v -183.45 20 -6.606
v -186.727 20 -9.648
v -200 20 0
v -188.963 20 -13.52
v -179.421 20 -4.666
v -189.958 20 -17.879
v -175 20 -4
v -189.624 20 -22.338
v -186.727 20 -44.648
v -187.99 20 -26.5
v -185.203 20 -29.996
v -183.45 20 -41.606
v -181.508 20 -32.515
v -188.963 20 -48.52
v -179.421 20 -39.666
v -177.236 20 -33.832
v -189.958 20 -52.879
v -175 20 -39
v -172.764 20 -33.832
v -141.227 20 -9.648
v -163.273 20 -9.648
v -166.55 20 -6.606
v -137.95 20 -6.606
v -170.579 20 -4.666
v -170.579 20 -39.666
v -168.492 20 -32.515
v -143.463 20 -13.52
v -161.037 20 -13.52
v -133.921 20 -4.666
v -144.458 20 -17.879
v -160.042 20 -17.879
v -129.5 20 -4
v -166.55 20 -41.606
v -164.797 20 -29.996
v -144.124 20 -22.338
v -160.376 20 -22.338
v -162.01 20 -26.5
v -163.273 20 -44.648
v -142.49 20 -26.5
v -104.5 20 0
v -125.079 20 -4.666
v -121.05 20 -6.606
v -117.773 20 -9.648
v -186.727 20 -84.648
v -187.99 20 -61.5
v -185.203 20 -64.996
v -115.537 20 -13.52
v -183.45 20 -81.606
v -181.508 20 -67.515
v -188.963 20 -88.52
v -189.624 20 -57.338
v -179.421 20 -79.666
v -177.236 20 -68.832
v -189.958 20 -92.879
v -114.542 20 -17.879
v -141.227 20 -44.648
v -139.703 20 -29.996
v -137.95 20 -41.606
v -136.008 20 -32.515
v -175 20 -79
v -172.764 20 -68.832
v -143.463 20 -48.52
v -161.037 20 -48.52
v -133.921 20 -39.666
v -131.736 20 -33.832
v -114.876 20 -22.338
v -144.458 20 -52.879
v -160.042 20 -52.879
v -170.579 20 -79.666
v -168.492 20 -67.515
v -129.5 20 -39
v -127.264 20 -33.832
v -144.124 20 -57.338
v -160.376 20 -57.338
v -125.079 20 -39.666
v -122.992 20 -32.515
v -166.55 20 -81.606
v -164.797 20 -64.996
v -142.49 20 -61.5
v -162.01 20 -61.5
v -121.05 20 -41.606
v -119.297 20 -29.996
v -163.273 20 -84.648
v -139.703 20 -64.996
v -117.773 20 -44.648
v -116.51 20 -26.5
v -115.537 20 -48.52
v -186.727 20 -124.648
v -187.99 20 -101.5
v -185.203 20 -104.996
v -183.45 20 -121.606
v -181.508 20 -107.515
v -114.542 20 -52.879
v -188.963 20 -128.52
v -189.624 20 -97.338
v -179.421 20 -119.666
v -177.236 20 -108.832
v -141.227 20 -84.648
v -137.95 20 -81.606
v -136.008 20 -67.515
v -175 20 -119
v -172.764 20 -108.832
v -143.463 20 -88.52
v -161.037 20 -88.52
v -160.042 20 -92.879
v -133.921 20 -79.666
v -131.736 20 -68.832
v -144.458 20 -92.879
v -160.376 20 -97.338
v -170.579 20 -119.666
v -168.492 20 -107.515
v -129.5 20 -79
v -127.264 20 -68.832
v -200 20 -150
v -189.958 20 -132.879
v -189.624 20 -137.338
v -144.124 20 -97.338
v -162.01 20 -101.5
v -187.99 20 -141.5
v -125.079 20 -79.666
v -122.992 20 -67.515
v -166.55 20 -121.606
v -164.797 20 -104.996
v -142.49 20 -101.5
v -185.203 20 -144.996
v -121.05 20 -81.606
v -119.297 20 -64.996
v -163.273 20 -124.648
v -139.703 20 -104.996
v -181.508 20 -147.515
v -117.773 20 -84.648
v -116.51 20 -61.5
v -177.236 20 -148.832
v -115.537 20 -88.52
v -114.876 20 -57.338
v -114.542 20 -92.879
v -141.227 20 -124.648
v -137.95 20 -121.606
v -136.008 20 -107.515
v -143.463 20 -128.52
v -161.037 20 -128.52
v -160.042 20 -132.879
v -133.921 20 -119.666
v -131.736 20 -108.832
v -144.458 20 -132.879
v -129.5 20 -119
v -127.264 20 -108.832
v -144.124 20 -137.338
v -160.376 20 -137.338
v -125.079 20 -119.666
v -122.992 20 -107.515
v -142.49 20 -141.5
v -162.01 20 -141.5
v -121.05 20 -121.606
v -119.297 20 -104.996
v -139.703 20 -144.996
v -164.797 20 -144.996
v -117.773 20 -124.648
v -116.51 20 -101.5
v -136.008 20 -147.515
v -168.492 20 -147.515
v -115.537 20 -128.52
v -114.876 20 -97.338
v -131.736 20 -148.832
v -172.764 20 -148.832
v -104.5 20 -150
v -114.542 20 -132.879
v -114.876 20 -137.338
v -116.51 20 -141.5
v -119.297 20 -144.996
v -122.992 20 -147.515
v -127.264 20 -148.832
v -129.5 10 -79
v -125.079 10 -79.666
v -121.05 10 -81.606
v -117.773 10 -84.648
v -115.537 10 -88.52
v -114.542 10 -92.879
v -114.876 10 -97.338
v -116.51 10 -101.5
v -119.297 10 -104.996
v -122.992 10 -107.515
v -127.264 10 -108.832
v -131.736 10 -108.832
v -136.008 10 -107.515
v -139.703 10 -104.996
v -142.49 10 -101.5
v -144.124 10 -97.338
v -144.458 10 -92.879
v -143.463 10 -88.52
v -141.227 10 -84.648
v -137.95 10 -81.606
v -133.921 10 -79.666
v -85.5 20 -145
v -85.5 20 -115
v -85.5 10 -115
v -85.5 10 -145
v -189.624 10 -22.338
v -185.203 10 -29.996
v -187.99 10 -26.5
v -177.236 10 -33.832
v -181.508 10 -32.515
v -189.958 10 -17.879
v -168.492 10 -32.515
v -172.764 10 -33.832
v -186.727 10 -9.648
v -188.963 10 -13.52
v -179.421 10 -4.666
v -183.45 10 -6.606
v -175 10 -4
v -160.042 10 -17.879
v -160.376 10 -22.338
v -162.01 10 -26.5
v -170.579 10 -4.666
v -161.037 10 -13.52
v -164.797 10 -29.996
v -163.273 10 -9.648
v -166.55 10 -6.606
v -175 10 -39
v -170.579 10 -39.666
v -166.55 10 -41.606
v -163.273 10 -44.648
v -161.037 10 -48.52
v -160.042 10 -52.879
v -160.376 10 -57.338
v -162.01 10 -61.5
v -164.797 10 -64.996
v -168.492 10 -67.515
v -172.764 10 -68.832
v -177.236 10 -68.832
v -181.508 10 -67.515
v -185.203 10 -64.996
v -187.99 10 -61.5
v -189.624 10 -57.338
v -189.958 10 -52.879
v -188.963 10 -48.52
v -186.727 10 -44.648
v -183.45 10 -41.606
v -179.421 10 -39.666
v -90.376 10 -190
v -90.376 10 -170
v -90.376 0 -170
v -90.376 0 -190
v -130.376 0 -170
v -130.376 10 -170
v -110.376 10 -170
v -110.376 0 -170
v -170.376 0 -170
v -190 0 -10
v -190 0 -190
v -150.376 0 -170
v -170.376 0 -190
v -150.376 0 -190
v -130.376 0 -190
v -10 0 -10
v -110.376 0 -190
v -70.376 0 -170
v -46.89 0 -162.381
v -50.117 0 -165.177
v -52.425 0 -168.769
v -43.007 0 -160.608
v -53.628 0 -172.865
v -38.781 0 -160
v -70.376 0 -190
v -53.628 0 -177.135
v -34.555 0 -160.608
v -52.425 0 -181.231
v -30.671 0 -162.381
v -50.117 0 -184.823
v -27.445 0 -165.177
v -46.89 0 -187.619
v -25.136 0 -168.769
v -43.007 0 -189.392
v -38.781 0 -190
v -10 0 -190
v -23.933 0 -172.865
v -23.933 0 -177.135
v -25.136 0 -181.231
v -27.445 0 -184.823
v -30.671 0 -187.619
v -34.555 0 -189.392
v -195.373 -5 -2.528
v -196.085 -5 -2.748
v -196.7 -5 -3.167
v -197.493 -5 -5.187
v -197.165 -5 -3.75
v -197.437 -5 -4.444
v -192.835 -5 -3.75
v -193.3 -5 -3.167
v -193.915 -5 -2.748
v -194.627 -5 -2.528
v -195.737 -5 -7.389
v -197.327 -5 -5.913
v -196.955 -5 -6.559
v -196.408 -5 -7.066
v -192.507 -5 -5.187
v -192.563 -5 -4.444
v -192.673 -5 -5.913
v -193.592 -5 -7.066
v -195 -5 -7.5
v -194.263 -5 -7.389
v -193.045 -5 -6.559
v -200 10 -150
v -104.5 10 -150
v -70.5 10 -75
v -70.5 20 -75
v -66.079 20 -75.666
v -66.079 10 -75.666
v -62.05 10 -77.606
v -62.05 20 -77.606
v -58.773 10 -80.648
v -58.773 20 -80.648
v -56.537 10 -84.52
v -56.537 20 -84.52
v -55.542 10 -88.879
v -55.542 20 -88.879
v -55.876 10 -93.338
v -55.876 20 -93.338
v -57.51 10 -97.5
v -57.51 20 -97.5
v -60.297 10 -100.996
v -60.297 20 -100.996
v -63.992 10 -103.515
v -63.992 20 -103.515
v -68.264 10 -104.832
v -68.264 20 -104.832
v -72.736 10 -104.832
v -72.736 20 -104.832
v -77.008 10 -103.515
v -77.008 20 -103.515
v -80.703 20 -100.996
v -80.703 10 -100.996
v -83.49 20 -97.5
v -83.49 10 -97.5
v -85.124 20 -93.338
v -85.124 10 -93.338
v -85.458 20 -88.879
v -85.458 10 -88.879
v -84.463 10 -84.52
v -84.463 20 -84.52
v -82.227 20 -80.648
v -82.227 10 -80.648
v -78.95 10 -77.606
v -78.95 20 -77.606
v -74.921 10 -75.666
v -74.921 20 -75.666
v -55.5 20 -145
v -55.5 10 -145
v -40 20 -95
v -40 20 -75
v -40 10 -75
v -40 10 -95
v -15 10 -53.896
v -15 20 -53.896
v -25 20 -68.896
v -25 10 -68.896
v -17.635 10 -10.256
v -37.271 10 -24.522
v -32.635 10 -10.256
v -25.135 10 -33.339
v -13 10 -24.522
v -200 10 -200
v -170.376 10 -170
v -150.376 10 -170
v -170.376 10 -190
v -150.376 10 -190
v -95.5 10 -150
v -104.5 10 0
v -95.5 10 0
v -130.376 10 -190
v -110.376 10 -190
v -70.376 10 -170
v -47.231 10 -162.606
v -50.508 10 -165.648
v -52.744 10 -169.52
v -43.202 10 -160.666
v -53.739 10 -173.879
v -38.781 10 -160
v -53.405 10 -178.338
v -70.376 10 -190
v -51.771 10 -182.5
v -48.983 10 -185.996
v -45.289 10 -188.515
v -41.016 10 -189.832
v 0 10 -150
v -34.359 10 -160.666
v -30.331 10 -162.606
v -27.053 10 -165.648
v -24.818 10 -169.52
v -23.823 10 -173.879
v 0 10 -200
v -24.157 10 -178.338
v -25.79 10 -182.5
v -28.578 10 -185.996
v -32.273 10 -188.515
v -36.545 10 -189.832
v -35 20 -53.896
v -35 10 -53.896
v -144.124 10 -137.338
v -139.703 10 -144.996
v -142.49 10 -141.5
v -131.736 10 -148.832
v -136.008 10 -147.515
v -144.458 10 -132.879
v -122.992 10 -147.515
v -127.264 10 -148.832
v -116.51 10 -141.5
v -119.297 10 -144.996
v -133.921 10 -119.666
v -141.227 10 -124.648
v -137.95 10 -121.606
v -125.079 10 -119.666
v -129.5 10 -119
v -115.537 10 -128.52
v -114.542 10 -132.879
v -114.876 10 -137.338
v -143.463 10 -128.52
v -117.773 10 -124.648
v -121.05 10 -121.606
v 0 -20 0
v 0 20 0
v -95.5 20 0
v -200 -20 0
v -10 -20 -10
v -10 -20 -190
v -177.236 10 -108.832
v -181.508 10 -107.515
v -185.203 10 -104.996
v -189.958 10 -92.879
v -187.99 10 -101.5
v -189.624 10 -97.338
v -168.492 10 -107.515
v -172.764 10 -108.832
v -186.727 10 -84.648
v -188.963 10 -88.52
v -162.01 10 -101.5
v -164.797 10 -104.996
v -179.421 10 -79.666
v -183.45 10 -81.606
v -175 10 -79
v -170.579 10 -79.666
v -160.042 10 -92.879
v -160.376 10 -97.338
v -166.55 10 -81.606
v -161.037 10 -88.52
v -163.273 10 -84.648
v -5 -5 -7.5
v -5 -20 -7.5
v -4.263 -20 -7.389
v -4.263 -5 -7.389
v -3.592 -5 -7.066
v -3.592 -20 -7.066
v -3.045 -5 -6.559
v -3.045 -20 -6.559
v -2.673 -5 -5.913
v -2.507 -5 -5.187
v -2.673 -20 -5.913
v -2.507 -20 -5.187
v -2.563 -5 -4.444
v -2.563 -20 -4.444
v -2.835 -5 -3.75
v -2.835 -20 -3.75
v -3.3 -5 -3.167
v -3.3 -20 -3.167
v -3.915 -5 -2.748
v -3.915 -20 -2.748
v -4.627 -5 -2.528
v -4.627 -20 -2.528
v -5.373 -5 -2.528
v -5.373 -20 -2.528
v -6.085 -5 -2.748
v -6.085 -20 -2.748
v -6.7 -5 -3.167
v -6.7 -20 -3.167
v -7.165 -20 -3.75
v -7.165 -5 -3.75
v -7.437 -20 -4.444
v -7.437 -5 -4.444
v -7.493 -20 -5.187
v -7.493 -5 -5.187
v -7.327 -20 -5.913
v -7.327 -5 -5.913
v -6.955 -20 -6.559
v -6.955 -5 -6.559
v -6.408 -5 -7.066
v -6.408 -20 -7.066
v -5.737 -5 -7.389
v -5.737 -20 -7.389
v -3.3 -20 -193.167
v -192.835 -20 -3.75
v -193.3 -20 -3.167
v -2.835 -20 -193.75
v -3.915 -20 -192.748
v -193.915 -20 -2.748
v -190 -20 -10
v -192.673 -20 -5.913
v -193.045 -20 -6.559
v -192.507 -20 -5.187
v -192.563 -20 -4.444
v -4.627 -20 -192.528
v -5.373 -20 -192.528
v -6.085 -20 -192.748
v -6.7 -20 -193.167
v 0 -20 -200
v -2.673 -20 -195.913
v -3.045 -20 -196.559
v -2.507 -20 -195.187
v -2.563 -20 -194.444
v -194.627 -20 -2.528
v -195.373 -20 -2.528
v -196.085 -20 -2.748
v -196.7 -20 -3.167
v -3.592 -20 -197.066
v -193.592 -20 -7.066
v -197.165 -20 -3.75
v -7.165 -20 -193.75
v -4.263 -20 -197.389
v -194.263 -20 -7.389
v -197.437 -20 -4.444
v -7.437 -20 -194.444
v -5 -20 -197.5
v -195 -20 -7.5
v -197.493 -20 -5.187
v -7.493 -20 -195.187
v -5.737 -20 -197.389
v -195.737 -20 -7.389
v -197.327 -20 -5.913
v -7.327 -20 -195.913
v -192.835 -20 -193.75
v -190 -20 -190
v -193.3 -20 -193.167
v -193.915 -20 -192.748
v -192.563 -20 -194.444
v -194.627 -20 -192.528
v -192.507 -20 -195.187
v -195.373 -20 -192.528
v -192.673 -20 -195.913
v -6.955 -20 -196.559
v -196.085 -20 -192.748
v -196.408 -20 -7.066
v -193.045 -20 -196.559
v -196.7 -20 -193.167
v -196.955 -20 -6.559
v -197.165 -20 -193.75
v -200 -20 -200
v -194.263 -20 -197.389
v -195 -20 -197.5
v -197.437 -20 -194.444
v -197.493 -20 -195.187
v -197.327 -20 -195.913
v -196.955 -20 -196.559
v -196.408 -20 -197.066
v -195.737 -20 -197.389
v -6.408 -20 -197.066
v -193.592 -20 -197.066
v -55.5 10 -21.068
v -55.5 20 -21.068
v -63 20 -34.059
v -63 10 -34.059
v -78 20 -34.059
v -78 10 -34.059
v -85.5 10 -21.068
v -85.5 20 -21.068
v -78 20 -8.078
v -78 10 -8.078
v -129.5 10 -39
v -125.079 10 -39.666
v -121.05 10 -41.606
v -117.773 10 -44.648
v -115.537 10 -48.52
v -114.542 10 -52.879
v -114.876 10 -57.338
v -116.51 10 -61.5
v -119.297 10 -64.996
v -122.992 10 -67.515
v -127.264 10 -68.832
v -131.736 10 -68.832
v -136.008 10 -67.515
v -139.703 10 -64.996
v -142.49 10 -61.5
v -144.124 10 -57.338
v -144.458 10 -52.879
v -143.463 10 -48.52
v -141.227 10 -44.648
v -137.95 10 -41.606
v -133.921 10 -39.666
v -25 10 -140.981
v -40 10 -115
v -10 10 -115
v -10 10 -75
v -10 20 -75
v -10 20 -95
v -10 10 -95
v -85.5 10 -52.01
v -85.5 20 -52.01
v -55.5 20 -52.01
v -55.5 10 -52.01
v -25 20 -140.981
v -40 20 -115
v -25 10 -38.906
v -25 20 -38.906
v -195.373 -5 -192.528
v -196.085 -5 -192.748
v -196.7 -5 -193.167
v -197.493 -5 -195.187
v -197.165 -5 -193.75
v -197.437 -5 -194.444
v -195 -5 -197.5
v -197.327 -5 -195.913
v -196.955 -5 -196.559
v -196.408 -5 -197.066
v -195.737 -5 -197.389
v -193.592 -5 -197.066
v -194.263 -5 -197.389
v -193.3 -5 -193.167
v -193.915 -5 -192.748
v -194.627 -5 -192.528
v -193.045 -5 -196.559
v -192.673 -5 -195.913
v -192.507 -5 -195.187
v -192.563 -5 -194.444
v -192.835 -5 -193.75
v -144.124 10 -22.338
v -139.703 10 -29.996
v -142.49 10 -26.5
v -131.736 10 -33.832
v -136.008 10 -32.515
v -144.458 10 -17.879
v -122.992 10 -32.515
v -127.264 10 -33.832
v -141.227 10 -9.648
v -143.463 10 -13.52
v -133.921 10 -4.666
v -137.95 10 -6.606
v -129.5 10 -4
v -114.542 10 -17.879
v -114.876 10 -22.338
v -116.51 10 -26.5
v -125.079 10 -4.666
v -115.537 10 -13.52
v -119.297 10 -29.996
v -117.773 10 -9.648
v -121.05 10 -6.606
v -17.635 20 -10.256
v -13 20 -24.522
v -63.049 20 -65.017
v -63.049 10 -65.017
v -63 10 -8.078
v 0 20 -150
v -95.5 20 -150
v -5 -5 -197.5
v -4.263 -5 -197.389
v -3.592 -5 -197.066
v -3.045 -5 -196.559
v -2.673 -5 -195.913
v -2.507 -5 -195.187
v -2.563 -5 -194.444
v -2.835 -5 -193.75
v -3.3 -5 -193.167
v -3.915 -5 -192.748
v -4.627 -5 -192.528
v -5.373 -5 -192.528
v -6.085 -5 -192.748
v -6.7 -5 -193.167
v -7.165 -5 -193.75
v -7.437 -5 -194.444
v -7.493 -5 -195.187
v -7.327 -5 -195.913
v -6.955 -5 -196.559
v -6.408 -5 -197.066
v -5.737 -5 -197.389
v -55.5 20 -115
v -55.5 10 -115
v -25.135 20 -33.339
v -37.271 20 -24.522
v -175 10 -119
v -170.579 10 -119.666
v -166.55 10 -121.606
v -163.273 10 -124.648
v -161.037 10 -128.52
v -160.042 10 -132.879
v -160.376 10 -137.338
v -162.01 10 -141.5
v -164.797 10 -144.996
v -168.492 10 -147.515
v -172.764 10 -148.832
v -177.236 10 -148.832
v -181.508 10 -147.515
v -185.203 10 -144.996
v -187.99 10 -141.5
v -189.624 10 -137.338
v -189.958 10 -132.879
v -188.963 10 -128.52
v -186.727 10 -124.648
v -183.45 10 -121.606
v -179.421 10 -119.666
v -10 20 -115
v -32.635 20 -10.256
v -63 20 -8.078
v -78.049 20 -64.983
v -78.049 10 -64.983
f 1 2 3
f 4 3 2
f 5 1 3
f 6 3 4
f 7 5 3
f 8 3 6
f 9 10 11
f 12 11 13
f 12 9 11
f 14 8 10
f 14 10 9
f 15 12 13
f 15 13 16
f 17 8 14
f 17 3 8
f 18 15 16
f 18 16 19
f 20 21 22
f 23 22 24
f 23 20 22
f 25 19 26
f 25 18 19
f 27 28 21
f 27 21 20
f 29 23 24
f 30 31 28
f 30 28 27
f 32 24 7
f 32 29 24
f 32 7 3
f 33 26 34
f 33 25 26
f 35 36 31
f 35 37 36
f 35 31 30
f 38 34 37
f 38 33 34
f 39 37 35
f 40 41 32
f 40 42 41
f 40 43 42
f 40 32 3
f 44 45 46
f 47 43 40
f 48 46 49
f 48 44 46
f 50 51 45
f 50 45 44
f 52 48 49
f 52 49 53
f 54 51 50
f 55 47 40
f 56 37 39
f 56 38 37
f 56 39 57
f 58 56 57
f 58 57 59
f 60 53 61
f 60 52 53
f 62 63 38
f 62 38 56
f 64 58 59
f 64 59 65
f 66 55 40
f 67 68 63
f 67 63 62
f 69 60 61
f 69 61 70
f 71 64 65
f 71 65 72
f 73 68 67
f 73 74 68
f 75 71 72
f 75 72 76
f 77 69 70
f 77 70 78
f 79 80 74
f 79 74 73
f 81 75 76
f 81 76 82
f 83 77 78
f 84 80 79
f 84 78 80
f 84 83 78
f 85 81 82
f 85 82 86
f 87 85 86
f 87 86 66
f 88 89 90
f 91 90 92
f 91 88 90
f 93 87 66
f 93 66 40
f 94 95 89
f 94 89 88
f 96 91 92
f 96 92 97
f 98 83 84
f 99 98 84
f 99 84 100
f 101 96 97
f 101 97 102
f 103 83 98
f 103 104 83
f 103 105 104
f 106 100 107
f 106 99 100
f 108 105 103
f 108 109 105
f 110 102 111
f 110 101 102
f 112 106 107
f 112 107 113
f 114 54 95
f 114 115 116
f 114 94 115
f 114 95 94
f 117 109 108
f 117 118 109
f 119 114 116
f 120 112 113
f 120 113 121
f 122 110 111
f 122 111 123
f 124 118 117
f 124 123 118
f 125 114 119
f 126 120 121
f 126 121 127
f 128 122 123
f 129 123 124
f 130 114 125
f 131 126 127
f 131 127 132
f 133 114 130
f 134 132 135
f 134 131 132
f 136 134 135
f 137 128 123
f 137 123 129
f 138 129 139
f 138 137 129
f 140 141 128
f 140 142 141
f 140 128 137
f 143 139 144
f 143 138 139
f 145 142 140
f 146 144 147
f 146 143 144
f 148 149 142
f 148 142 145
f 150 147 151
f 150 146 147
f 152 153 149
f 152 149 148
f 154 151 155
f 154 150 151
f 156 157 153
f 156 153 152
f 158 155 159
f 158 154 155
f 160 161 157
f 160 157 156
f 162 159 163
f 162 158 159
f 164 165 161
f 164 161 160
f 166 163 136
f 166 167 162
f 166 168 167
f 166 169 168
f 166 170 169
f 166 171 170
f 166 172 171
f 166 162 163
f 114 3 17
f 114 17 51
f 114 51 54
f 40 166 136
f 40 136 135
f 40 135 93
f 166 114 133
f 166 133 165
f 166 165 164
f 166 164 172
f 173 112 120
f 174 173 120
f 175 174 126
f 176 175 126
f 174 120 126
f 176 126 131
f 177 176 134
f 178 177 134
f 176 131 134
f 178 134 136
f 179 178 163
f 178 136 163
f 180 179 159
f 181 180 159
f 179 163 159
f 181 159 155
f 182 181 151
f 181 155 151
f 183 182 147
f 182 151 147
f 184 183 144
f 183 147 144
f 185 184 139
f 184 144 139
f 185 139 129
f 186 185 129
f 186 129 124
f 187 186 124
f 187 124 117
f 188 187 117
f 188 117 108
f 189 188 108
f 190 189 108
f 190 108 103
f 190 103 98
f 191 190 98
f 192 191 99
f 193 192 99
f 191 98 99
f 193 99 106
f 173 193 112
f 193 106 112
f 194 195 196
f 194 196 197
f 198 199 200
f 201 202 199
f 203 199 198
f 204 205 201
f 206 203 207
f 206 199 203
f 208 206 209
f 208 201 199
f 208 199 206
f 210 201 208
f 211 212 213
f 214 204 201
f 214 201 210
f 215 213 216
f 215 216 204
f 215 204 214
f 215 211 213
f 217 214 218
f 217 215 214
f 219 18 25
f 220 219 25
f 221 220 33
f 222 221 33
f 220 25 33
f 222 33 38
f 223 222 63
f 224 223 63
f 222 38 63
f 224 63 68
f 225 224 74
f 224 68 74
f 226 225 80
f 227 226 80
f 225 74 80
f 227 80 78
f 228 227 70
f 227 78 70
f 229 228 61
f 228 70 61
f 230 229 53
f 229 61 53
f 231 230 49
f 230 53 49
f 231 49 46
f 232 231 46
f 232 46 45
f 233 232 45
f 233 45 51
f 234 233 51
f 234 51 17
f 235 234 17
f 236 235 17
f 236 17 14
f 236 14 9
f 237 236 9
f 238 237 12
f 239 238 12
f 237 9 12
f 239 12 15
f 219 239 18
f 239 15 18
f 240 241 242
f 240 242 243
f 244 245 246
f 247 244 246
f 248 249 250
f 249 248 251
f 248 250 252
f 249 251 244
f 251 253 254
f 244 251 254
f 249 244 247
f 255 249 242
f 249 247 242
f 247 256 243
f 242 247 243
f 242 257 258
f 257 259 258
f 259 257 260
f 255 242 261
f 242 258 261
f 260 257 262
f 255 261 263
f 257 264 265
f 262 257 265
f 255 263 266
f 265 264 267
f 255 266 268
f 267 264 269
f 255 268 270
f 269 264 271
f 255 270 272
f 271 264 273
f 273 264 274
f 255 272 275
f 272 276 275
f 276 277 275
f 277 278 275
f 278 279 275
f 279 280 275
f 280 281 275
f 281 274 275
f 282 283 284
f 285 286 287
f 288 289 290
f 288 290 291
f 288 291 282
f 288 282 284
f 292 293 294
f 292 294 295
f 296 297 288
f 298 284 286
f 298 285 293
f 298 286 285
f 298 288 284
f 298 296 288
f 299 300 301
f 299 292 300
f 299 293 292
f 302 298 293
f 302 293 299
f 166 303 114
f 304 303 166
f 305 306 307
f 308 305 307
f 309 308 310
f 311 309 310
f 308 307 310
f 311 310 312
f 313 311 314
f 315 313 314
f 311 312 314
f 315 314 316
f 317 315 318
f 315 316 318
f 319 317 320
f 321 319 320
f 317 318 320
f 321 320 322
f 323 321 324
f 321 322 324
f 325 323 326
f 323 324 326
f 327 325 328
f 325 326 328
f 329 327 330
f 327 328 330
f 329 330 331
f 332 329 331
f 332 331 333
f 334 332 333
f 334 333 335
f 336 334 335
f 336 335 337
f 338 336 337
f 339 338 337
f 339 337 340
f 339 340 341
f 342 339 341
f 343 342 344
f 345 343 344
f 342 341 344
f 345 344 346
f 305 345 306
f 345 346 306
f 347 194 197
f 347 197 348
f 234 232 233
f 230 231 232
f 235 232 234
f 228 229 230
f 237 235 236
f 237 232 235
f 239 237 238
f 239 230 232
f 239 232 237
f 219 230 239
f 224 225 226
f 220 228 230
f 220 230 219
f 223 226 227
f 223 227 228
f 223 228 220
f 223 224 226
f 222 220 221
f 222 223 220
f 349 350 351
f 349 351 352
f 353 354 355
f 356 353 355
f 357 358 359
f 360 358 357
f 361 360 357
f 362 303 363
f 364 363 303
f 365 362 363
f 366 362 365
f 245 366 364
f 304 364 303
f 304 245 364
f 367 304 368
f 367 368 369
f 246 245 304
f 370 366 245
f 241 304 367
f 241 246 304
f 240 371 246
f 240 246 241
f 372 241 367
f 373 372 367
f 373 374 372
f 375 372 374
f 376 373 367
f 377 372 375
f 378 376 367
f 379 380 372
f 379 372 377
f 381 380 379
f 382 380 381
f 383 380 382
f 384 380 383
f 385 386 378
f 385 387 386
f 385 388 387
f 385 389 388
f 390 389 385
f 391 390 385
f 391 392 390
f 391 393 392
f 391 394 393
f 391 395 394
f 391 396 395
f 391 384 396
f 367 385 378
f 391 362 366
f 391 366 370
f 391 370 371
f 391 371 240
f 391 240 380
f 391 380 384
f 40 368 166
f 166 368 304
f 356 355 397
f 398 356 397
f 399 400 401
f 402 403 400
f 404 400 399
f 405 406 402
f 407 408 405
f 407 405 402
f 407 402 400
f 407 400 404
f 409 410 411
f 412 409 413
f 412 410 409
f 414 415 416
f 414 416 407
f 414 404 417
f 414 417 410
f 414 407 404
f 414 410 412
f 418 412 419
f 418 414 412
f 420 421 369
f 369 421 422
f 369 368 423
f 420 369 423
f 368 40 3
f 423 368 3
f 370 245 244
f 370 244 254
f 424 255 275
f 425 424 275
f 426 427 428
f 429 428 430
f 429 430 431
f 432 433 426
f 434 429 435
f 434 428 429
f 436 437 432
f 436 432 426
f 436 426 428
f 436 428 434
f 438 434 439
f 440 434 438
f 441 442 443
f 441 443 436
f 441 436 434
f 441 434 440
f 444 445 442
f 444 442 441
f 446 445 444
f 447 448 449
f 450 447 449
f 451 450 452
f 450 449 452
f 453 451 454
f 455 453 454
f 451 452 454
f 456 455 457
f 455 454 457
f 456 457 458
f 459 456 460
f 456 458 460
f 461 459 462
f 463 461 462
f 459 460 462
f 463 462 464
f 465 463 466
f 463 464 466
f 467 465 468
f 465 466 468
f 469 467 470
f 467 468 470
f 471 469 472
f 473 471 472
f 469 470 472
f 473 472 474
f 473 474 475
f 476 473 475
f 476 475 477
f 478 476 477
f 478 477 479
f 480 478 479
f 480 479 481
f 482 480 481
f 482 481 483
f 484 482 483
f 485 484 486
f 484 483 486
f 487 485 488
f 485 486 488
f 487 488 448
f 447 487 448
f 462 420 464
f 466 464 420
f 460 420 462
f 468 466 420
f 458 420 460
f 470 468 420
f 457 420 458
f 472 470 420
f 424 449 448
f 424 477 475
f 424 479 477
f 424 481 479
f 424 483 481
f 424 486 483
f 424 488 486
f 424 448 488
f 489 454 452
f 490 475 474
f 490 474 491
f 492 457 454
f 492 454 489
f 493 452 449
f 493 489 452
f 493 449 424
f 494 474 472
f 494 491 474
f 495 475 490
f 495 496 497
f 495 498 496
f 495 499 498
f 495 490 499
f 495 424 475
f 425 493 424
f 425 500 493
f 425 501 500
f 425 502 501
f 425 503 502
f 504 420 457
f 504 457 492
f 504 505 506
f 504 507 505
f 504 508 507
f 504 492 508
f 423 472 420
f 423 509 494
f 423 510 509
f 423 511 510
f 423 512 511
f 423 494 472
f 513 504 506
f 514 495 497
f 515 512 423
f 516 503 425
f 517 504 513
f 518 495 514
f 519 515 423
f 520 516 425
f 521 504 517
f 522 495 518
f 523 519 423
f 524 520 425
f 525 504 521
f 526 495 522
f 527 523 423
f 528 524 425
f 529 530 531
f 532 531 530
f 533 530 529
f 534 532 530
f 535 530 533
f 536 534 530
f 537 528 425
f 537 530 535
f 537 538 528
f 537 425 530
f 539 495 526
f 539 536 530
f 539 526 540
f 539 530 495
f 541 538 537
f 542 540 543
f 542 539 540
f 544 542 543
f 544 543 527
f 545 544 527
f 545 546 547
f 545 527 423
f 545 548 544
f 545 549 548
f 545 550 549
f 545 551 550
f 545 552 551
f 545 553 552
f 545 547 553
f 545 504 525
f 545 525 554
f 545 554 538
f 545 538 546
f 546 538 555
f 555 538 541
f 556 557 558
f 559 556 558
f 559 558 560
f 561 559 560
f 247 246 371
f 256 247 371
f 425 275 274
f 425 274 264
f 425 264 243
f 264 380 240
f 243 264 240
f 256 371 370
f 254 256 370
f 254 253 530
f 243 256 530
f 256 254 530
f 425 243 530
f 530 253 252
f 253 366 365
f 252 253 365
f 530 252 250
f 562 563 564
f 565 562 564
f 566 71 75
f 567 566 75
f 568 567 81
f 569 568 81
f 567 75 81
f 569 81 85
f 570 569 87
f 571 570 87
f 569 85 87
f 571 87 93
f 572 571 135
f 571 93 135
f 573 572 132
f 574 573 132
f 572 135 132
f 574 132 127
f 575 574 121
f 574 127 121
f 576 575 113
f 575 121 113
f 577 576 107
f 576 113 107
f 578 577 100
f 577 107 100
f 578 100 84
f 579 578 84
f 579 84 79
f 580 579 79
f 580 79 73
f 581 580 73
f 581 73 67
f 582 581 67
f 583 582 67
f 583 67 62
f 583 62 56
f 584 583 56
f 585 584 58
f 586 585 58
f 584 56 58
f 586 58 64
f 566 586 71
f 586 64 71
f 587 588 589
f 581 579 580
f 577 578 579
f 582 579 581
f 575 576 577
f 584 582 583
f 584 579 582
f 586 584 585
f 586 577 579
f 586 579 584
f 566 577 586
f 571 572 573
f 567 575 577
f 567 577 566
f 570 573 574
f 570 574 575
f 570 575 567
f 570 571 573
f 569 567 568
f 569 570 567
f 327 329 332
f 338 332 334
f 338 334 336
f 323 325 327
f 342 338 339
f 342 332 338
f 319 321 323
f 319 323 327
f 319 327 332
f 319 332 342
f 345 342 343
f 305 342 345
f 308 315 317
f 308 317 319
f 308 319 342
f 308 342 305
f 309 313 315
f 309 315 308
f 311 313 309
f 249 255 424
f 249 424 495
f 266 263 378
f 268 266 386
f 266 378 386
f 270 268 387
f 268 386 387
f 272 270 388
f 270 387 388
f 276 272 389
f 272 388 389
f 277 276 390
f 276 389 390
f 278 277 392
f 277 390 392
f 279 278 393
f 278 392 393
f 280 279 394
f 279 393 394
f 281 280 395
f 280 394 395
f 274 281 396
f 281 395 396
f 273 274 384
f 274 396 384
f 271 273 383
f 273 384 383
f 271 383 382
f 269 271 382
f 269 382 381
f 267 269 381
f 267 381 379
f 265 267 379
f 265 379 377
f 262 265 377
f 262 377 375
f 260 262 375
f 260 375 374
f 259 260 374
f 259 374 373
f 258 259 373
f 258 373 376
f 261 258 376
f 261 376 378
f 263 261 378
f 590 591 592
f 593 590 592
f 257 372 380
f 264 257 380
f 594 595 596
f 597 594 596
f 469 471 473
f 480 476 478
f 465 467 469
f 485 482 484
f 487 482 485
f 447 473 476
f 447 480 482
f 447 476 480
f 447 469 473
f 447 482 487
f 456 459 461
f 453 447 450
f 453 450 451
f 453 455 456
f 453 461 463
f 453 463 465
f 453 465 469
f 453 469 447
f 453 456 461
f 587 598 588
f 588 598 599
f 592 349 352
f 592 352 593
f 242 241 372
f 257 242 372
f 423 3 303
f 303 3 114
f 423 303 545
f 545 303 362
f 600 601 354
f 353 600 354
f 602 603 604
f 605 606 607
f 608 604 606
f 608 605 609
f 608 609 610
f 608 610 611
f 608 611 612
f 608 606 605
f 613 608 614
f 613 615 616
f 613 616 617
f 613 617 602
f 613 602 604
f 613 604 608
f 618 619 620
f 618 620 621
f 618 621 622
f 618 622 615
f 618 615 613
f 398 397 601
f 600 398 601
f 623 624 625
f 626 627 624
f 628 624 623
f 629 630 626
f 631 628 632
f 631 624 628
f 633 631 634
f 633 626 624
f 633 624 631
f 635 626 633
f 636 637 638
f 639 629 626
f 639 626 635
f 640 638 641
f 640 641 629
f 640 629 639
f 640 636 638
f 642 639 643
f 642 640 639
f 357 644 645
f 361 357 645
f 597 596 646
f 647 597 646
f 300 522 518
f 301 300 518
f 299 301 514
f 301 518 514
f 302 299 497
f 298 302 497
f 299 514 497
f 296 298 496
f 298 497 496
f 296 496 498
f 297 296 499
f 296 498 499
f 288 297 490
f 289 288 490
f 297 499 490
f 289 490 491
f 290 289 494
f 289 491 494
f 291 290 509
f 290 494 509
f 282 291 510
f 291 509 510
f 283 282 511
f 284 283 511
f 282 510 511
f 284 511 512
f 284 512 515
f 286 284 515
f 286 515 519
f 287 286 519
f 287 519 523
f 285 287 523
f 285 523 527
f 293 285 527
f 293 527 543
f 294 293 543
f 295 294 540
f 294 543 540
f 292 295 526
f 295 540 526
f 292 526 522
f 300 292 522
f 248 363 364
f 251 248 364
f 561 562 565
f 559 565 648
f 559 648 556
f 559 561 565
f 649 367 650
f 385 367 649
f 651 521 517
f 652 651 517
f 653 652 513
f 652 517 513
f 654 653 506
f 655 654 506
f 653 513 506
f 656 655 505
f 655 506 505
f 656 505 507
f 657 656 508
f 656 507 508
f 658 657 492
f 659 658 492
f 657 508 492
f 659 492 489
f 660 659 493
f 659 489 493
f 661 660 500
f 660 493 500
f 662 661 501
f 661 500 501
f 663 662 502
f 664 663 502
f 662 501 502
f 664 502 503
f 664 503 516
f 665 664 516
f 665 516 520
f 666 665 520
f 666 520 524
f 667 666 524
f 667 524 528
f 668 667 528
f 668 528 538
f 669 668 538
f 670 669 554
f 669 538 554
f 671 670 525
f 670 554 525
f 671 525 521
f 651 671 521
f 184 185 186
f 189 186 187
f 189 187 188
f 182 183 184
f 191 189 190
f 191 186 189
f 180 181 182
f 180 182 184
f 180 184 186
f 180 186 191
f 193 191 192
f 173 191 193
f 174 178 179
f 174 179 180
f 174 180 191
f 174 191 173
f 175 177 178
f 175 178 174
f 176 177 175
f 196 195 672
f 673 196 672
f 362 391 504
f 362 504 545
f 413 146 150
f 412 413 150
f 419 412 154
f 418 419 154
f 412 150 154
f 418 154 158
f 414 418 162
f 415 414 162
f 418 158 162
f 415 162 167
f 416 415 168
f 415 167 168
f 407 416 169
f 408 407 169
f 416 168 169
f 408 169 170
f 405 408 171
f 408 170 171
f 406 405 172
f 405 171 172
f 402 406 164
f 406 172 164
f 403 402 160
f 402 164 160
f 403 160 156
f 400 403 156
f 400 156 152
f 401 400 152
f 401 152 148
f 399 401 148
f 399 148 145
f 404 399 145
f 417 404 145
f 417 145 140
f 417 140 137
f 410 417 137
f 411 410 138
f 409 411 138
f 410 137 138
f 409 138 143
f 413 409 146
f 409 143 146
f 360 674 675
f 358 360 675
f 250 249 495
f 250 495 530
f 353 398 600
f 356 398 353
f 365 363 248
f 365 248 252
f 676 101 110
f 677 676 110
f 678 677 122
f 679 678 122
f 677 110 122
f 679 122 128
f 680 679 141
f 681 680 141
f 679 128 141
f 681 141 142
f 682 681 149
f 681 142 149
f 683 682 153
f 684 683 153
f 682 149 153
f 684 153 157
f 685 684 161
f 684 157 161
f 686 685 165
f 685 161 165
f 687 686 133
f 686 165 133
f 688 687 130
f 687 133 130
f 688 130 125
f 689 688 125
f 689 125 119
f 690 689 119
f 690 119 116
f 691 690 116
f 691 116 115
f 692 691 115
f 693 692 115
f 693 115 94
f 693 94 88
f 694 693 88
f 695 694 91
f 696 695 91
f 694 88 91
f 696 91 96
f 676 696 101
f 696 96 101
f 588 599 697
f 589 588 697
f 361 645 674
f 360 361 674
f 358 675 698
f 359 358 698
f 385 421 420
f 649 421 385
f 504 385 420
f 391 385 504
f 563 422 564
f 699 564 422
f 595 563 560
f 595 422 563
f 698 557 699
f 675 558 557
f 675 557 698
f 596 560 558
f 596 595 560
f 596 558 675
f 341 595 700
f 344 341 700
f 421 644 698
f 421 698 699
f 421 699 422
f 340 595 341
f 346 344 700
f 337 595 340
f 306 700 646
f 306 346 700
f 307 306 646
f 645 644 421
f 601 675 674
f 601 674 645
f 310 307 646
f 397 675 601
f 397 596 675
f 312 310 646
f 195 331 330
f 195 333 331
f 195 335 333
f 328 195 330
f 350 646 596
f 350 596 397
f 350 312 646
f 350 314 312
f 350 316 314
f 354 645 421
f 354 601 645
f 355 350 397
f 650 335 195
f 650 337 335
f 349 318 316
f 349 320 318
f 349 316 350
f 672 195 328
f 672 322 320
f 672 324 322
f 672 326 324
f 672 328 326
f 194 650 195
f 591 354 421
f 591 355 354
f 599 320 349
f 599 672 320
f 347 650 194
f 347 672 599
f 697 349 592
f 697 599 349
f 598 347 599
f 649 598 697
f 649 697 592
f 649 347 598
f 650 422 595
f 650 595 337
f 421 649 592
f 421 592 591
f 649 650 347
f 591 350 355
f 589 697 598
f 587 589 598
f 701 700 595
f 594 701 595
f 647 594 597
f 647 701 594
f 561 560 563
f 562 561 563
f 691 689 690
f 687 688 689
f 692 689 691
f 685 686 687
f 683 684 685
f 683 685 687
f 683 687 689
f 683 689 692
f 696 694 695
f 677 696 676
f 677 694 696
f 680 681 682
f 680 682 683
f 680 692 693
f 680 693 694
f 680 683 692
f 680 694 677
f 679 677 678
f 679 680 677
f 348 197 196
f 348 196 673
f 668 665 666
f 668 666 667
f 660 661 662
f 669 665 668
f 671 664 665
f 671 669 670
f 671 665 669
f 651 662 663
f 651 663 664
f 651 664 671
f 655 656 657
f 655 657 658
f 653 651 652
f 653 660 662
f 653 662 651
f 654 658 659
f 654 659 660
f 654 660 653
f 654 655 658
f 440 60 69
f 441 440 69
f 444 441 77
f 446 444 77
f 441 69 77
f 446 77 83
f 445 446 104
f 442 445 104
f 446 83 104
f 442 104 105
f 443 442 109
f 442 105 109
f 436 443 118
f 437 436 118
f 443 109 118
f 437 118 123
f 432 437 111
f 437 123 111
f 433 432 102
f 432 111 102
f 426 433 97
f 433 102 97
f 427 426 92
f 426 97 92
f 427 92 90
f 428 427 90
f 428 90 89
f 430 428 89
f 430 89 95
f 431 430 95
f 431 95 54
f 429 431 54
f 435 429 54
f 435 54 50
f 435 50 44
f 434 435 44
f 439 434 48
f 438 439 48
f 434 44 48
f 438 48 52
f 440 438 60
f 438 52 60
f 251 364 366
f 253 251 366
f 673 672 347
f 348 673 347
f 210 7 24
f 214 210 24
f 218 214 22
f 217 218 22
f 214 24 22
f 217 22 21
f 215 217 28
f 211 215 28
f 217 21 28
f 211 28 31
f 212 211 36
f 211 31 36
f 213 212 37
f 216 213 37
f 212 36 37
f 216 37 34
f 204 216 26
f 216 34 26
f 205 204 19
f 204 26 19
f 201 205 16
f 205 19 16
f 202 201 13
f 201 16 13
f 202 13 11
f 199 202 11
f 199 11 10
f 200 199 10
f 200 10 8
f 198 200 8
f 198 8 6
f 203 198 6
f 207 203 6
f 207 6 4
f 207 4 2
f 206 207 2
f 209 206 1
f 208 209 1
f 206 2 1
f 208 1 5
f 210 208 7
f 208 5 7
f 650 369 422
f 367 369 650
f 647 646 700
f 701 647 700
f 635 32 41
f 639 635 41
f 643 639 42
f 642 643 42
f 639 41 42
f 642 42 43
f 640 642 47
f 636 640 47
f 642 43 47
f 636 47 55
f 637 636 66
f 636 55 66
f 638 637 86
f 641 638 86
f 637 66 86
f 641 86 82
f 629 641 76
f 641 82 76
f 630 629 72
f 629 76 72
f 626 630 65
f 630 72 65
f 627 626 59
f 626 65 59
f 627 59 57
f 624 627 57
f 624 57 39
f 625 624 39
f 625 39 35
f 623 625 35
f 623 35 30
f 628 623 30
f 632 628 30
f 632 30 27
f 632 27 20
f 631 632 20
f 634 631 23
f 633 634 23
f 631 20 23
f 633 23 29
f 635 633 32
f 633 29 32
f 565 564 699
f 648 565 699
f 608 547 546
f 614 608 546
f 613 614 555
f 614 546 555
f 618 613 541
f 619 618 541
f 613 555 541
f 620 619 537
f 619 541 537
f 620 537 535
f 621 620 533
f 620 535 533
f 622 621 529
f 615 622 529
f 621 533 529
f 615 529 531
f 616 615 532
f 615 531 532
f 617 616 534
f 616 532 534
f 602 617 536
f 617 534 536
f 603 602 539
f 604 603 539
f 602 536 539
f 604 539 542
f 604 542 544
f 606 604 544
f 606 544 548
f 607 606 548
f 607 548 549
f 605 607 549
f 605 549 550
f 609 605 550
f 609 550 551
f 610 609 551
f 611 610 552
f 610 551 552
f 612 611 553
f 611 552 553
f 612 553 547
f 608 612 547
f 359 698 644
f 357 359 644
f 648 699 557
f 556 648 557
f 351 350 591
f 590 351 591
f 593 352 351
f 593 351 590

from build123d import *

# Parameters (mm, degrees)
CROQUIS1_W              = 200
CROQUIS1_H              = 200
SALIENTE_EXTRUIR1_DEPTH = 10
CROQUIS2_W              = 95.5
CROQUIS2_H              = 150
SALIENTE_EXTRUIR2_DEPTH = 10
CROQUIS3_R              = 15
CROQUIS3_W              = 20
CROQUIS3_H              = 20
CORTAR_EXTRUIR1_DEPTH   = 284.019433962
CROQUIS4_W              = 200
CROQUIS4_H              = 200
CROQUIS4_W_2            = 180
CROQUIS4_H_2            = 180
SALIENTE_EXTRUIR3_DEPTH = 20
CROQUIS6_R              = 2.5
CORTAR_EXTRUIR2_DEPTH   = 15
CROQUIS7_R              = 15
CORTAR_EXTRUIR3_DEPTH   = 10
CROQUIS8_R              = 15
CROQUIS8_W              = 30
CROQUIS8_H              = 30
CROQUIS8_H_2            = 20
CORTAR_EXTRUIR4_DEPTH   = 10


with BuildPart() as part:
    # Croquis1 → Saliente-Extruir1 (new body)
    with BuildSketch(Plane(origin=(0, 0, 0), x_dir=(1, 0, 0), z_dir=(0, 1, 0))):
        with Locations((-100, 100)):
            Rectangle(CROQUIS1_W, CROQUIS1_H)
    extrude(amount=SALIENTE_EXTRUIR1_DEPTH)

    # Croquis2 → Saliente-Extruir2 (add)
    with BuildSketch(Plane(origin=(0, 10, 0), x_dir=(1, 0, 0), z_dir=(0, 1, 0))):
        with Locations((-47.75, 75)):
            Rectangle(CROQUIS2_W, CROQUIS2_H)
        with Locations((-152.25, 75)):
            Rectangle(CROQUIS2_W, CROQUIS2_H)
    extrude(amount=SALIENTE_EXTRUIR2_DEPTH)

    # Croquis3 → Cortar-Extruir1 (cut, through all)
    with BuildSketch(Plane(origin=(0, 10, 0), x_dir=(1, 0, 0), z_dir=(0, 1, 0))):
        with Locations(Location((-38.780765976, 175, 0), (0, 0, 270))):
            Circle(CROQUIS3_R)
        with Locations((-160.375957062, 180)):
            Rectangle(CROQUIS3_W, CROQUIS3_H)
        with Locations((-120.375957062, 180)):
            Rectangle(CROQUIS3_W, CROQUIS3_H)
        with Locations((-80.375957062, 180)):
            Rectangle(CROQUIS3_W, CROQUIS3_H)
    extrude(amount=-CORTAR_EXTRUIR1_DEPTH, mode=Mode.SUBTRACT)

    # Croquis4 → Saliente-Extruir3 (add)
    with BuildSketch(Plane(origin=(0, 0, 0), x_dir=(-1, 0, 0), z_dir=(0, -1, 0))):
        with Locations((100, 100)):
            Rectangle(CROQUIS4_W, CROQUIS4_H)
        with Locations((100, 100)):
            Rectangle(CROQUIS4_W_2, CROQUIS4_H_2, mode=Mode.SUBTRACT)
    extrude(amount=SALIENTE_EXTRUIR3_DEPTH)

    # Croquis6 → Cortar-Extruir2 (cut)
    with BuildSketch(Plane(origin=(0, -20, 0), x_dir=(-1, 0, 0), z_dir=(0, -1, 0))):
        with Locations(Location((195, 5, 0), (0, 0, 90))):
            Circle(CROQUIS6_R)
        with Locations(Location((5, 5, 0), (0, 0, 90))):
            Circle(CROQUIS6_R)
        with Locations(Location((5, 195, 0), (0, 0, 90))):
            Circle(CROQUIS6_R)
        with Locations(Location((195, 195, 0), (0, 0, 90))):
            Circle(CROQUIS6_R)
    extrude(amount=-CORTAR_EXTRUIR2_DEPTH, mode=Mode.SUBTRACT)

    # Croquis7 → Cortar-Extruir3 (cut)
    with BuildSketch(Plane(origin=(0, 20, 0), x_dir=(1, 0, 0), z_dir=(0, 1, 0))):
        with Locations(Location((-175, 134, 0), (0, 0, 270))):
            Circle(CROQUIS7_R)
        with Locations(Location((-129.5, 134, 0), (0, 0, 270))):
            Circle(CROQUIS7_R)
        with Locations(Location((-175, 94, 0), (0, 0, 270))):
            Circle(CROQUIS7_R)
        with Locations(Location((-129.5, 94, 0), (0, 0, 270))):
            Circle(CROQUIS7_R)
        with Locations(Location((-175, 54, 0), (0, 0, 270))):
            Circle(CROQUIS7_R)
        with Locations(Location((-129.5, 54, 0), (0, 0, 270))):
            Circle(CROQUIS7_R)
        with Locations(Location((-175, 19, 0), (0, 0, 270))):
            Circle(CROQUIS7_R)
        with Locations(Location((-129.5, 19, 0), (0, 0, 270))):
            Circle(CROQUIS7_R)
    extrude(amount=-CORTAR_EXTRUIR3_DEPTH, mode=Mode.SUBTRACT)

    # Croquis8 → Cortar-Extruir4 (cut)
    with BuildSketch(Plane(origin=(0, 20, 0), x_dir=(1, 0, 0), z_dir=(0, 1, 0))):
        with Locations(Location((-70.5, 90, 0), (0, 0, 270))):
            Circle(CROQUIS8_R)
        with Locations((-70.5, 130)):
            Rectangle(CROQUIS8_W, CROQUIS8_H)
        Polygon((-40, 115), (-10, 115), (-25, 140.980762114), align=None)
        Polygon((-85.5, 52.009587992), (-55.5, 52.009587992), (-63.049173048, 65.016851393), (-78.04913439, 64.982796557), align=None)
        with Locations((-25, 85)):
            Rectangle(CROQUIS8_W, CROQUIS8_H_2)
        Polygon((-25, 68.896042606), (-35, 53.896042606), (-25, 38.905718571), (-15, 53.896042606), align=None)
        Polygon((-55.5, 21.068183762), (-63, 34.058564819), (-78, 34.058564819), (-85.5, 21.068183762), (-78, 8.077802706), (-63, 8.077802706), align=None)
        Polygon((-25.135254916, 33.338916583), (-37.270509831, 24.522137799), (-32.635254916, 10.256290054), (-17.635254916, 10.256290054), (-13, 24.522137799), align=None)
    extrude(amount=-CORTAR_EXTRUIR4_DEPTH, mode=Mode.SUBTRACT)


solid = part.part
